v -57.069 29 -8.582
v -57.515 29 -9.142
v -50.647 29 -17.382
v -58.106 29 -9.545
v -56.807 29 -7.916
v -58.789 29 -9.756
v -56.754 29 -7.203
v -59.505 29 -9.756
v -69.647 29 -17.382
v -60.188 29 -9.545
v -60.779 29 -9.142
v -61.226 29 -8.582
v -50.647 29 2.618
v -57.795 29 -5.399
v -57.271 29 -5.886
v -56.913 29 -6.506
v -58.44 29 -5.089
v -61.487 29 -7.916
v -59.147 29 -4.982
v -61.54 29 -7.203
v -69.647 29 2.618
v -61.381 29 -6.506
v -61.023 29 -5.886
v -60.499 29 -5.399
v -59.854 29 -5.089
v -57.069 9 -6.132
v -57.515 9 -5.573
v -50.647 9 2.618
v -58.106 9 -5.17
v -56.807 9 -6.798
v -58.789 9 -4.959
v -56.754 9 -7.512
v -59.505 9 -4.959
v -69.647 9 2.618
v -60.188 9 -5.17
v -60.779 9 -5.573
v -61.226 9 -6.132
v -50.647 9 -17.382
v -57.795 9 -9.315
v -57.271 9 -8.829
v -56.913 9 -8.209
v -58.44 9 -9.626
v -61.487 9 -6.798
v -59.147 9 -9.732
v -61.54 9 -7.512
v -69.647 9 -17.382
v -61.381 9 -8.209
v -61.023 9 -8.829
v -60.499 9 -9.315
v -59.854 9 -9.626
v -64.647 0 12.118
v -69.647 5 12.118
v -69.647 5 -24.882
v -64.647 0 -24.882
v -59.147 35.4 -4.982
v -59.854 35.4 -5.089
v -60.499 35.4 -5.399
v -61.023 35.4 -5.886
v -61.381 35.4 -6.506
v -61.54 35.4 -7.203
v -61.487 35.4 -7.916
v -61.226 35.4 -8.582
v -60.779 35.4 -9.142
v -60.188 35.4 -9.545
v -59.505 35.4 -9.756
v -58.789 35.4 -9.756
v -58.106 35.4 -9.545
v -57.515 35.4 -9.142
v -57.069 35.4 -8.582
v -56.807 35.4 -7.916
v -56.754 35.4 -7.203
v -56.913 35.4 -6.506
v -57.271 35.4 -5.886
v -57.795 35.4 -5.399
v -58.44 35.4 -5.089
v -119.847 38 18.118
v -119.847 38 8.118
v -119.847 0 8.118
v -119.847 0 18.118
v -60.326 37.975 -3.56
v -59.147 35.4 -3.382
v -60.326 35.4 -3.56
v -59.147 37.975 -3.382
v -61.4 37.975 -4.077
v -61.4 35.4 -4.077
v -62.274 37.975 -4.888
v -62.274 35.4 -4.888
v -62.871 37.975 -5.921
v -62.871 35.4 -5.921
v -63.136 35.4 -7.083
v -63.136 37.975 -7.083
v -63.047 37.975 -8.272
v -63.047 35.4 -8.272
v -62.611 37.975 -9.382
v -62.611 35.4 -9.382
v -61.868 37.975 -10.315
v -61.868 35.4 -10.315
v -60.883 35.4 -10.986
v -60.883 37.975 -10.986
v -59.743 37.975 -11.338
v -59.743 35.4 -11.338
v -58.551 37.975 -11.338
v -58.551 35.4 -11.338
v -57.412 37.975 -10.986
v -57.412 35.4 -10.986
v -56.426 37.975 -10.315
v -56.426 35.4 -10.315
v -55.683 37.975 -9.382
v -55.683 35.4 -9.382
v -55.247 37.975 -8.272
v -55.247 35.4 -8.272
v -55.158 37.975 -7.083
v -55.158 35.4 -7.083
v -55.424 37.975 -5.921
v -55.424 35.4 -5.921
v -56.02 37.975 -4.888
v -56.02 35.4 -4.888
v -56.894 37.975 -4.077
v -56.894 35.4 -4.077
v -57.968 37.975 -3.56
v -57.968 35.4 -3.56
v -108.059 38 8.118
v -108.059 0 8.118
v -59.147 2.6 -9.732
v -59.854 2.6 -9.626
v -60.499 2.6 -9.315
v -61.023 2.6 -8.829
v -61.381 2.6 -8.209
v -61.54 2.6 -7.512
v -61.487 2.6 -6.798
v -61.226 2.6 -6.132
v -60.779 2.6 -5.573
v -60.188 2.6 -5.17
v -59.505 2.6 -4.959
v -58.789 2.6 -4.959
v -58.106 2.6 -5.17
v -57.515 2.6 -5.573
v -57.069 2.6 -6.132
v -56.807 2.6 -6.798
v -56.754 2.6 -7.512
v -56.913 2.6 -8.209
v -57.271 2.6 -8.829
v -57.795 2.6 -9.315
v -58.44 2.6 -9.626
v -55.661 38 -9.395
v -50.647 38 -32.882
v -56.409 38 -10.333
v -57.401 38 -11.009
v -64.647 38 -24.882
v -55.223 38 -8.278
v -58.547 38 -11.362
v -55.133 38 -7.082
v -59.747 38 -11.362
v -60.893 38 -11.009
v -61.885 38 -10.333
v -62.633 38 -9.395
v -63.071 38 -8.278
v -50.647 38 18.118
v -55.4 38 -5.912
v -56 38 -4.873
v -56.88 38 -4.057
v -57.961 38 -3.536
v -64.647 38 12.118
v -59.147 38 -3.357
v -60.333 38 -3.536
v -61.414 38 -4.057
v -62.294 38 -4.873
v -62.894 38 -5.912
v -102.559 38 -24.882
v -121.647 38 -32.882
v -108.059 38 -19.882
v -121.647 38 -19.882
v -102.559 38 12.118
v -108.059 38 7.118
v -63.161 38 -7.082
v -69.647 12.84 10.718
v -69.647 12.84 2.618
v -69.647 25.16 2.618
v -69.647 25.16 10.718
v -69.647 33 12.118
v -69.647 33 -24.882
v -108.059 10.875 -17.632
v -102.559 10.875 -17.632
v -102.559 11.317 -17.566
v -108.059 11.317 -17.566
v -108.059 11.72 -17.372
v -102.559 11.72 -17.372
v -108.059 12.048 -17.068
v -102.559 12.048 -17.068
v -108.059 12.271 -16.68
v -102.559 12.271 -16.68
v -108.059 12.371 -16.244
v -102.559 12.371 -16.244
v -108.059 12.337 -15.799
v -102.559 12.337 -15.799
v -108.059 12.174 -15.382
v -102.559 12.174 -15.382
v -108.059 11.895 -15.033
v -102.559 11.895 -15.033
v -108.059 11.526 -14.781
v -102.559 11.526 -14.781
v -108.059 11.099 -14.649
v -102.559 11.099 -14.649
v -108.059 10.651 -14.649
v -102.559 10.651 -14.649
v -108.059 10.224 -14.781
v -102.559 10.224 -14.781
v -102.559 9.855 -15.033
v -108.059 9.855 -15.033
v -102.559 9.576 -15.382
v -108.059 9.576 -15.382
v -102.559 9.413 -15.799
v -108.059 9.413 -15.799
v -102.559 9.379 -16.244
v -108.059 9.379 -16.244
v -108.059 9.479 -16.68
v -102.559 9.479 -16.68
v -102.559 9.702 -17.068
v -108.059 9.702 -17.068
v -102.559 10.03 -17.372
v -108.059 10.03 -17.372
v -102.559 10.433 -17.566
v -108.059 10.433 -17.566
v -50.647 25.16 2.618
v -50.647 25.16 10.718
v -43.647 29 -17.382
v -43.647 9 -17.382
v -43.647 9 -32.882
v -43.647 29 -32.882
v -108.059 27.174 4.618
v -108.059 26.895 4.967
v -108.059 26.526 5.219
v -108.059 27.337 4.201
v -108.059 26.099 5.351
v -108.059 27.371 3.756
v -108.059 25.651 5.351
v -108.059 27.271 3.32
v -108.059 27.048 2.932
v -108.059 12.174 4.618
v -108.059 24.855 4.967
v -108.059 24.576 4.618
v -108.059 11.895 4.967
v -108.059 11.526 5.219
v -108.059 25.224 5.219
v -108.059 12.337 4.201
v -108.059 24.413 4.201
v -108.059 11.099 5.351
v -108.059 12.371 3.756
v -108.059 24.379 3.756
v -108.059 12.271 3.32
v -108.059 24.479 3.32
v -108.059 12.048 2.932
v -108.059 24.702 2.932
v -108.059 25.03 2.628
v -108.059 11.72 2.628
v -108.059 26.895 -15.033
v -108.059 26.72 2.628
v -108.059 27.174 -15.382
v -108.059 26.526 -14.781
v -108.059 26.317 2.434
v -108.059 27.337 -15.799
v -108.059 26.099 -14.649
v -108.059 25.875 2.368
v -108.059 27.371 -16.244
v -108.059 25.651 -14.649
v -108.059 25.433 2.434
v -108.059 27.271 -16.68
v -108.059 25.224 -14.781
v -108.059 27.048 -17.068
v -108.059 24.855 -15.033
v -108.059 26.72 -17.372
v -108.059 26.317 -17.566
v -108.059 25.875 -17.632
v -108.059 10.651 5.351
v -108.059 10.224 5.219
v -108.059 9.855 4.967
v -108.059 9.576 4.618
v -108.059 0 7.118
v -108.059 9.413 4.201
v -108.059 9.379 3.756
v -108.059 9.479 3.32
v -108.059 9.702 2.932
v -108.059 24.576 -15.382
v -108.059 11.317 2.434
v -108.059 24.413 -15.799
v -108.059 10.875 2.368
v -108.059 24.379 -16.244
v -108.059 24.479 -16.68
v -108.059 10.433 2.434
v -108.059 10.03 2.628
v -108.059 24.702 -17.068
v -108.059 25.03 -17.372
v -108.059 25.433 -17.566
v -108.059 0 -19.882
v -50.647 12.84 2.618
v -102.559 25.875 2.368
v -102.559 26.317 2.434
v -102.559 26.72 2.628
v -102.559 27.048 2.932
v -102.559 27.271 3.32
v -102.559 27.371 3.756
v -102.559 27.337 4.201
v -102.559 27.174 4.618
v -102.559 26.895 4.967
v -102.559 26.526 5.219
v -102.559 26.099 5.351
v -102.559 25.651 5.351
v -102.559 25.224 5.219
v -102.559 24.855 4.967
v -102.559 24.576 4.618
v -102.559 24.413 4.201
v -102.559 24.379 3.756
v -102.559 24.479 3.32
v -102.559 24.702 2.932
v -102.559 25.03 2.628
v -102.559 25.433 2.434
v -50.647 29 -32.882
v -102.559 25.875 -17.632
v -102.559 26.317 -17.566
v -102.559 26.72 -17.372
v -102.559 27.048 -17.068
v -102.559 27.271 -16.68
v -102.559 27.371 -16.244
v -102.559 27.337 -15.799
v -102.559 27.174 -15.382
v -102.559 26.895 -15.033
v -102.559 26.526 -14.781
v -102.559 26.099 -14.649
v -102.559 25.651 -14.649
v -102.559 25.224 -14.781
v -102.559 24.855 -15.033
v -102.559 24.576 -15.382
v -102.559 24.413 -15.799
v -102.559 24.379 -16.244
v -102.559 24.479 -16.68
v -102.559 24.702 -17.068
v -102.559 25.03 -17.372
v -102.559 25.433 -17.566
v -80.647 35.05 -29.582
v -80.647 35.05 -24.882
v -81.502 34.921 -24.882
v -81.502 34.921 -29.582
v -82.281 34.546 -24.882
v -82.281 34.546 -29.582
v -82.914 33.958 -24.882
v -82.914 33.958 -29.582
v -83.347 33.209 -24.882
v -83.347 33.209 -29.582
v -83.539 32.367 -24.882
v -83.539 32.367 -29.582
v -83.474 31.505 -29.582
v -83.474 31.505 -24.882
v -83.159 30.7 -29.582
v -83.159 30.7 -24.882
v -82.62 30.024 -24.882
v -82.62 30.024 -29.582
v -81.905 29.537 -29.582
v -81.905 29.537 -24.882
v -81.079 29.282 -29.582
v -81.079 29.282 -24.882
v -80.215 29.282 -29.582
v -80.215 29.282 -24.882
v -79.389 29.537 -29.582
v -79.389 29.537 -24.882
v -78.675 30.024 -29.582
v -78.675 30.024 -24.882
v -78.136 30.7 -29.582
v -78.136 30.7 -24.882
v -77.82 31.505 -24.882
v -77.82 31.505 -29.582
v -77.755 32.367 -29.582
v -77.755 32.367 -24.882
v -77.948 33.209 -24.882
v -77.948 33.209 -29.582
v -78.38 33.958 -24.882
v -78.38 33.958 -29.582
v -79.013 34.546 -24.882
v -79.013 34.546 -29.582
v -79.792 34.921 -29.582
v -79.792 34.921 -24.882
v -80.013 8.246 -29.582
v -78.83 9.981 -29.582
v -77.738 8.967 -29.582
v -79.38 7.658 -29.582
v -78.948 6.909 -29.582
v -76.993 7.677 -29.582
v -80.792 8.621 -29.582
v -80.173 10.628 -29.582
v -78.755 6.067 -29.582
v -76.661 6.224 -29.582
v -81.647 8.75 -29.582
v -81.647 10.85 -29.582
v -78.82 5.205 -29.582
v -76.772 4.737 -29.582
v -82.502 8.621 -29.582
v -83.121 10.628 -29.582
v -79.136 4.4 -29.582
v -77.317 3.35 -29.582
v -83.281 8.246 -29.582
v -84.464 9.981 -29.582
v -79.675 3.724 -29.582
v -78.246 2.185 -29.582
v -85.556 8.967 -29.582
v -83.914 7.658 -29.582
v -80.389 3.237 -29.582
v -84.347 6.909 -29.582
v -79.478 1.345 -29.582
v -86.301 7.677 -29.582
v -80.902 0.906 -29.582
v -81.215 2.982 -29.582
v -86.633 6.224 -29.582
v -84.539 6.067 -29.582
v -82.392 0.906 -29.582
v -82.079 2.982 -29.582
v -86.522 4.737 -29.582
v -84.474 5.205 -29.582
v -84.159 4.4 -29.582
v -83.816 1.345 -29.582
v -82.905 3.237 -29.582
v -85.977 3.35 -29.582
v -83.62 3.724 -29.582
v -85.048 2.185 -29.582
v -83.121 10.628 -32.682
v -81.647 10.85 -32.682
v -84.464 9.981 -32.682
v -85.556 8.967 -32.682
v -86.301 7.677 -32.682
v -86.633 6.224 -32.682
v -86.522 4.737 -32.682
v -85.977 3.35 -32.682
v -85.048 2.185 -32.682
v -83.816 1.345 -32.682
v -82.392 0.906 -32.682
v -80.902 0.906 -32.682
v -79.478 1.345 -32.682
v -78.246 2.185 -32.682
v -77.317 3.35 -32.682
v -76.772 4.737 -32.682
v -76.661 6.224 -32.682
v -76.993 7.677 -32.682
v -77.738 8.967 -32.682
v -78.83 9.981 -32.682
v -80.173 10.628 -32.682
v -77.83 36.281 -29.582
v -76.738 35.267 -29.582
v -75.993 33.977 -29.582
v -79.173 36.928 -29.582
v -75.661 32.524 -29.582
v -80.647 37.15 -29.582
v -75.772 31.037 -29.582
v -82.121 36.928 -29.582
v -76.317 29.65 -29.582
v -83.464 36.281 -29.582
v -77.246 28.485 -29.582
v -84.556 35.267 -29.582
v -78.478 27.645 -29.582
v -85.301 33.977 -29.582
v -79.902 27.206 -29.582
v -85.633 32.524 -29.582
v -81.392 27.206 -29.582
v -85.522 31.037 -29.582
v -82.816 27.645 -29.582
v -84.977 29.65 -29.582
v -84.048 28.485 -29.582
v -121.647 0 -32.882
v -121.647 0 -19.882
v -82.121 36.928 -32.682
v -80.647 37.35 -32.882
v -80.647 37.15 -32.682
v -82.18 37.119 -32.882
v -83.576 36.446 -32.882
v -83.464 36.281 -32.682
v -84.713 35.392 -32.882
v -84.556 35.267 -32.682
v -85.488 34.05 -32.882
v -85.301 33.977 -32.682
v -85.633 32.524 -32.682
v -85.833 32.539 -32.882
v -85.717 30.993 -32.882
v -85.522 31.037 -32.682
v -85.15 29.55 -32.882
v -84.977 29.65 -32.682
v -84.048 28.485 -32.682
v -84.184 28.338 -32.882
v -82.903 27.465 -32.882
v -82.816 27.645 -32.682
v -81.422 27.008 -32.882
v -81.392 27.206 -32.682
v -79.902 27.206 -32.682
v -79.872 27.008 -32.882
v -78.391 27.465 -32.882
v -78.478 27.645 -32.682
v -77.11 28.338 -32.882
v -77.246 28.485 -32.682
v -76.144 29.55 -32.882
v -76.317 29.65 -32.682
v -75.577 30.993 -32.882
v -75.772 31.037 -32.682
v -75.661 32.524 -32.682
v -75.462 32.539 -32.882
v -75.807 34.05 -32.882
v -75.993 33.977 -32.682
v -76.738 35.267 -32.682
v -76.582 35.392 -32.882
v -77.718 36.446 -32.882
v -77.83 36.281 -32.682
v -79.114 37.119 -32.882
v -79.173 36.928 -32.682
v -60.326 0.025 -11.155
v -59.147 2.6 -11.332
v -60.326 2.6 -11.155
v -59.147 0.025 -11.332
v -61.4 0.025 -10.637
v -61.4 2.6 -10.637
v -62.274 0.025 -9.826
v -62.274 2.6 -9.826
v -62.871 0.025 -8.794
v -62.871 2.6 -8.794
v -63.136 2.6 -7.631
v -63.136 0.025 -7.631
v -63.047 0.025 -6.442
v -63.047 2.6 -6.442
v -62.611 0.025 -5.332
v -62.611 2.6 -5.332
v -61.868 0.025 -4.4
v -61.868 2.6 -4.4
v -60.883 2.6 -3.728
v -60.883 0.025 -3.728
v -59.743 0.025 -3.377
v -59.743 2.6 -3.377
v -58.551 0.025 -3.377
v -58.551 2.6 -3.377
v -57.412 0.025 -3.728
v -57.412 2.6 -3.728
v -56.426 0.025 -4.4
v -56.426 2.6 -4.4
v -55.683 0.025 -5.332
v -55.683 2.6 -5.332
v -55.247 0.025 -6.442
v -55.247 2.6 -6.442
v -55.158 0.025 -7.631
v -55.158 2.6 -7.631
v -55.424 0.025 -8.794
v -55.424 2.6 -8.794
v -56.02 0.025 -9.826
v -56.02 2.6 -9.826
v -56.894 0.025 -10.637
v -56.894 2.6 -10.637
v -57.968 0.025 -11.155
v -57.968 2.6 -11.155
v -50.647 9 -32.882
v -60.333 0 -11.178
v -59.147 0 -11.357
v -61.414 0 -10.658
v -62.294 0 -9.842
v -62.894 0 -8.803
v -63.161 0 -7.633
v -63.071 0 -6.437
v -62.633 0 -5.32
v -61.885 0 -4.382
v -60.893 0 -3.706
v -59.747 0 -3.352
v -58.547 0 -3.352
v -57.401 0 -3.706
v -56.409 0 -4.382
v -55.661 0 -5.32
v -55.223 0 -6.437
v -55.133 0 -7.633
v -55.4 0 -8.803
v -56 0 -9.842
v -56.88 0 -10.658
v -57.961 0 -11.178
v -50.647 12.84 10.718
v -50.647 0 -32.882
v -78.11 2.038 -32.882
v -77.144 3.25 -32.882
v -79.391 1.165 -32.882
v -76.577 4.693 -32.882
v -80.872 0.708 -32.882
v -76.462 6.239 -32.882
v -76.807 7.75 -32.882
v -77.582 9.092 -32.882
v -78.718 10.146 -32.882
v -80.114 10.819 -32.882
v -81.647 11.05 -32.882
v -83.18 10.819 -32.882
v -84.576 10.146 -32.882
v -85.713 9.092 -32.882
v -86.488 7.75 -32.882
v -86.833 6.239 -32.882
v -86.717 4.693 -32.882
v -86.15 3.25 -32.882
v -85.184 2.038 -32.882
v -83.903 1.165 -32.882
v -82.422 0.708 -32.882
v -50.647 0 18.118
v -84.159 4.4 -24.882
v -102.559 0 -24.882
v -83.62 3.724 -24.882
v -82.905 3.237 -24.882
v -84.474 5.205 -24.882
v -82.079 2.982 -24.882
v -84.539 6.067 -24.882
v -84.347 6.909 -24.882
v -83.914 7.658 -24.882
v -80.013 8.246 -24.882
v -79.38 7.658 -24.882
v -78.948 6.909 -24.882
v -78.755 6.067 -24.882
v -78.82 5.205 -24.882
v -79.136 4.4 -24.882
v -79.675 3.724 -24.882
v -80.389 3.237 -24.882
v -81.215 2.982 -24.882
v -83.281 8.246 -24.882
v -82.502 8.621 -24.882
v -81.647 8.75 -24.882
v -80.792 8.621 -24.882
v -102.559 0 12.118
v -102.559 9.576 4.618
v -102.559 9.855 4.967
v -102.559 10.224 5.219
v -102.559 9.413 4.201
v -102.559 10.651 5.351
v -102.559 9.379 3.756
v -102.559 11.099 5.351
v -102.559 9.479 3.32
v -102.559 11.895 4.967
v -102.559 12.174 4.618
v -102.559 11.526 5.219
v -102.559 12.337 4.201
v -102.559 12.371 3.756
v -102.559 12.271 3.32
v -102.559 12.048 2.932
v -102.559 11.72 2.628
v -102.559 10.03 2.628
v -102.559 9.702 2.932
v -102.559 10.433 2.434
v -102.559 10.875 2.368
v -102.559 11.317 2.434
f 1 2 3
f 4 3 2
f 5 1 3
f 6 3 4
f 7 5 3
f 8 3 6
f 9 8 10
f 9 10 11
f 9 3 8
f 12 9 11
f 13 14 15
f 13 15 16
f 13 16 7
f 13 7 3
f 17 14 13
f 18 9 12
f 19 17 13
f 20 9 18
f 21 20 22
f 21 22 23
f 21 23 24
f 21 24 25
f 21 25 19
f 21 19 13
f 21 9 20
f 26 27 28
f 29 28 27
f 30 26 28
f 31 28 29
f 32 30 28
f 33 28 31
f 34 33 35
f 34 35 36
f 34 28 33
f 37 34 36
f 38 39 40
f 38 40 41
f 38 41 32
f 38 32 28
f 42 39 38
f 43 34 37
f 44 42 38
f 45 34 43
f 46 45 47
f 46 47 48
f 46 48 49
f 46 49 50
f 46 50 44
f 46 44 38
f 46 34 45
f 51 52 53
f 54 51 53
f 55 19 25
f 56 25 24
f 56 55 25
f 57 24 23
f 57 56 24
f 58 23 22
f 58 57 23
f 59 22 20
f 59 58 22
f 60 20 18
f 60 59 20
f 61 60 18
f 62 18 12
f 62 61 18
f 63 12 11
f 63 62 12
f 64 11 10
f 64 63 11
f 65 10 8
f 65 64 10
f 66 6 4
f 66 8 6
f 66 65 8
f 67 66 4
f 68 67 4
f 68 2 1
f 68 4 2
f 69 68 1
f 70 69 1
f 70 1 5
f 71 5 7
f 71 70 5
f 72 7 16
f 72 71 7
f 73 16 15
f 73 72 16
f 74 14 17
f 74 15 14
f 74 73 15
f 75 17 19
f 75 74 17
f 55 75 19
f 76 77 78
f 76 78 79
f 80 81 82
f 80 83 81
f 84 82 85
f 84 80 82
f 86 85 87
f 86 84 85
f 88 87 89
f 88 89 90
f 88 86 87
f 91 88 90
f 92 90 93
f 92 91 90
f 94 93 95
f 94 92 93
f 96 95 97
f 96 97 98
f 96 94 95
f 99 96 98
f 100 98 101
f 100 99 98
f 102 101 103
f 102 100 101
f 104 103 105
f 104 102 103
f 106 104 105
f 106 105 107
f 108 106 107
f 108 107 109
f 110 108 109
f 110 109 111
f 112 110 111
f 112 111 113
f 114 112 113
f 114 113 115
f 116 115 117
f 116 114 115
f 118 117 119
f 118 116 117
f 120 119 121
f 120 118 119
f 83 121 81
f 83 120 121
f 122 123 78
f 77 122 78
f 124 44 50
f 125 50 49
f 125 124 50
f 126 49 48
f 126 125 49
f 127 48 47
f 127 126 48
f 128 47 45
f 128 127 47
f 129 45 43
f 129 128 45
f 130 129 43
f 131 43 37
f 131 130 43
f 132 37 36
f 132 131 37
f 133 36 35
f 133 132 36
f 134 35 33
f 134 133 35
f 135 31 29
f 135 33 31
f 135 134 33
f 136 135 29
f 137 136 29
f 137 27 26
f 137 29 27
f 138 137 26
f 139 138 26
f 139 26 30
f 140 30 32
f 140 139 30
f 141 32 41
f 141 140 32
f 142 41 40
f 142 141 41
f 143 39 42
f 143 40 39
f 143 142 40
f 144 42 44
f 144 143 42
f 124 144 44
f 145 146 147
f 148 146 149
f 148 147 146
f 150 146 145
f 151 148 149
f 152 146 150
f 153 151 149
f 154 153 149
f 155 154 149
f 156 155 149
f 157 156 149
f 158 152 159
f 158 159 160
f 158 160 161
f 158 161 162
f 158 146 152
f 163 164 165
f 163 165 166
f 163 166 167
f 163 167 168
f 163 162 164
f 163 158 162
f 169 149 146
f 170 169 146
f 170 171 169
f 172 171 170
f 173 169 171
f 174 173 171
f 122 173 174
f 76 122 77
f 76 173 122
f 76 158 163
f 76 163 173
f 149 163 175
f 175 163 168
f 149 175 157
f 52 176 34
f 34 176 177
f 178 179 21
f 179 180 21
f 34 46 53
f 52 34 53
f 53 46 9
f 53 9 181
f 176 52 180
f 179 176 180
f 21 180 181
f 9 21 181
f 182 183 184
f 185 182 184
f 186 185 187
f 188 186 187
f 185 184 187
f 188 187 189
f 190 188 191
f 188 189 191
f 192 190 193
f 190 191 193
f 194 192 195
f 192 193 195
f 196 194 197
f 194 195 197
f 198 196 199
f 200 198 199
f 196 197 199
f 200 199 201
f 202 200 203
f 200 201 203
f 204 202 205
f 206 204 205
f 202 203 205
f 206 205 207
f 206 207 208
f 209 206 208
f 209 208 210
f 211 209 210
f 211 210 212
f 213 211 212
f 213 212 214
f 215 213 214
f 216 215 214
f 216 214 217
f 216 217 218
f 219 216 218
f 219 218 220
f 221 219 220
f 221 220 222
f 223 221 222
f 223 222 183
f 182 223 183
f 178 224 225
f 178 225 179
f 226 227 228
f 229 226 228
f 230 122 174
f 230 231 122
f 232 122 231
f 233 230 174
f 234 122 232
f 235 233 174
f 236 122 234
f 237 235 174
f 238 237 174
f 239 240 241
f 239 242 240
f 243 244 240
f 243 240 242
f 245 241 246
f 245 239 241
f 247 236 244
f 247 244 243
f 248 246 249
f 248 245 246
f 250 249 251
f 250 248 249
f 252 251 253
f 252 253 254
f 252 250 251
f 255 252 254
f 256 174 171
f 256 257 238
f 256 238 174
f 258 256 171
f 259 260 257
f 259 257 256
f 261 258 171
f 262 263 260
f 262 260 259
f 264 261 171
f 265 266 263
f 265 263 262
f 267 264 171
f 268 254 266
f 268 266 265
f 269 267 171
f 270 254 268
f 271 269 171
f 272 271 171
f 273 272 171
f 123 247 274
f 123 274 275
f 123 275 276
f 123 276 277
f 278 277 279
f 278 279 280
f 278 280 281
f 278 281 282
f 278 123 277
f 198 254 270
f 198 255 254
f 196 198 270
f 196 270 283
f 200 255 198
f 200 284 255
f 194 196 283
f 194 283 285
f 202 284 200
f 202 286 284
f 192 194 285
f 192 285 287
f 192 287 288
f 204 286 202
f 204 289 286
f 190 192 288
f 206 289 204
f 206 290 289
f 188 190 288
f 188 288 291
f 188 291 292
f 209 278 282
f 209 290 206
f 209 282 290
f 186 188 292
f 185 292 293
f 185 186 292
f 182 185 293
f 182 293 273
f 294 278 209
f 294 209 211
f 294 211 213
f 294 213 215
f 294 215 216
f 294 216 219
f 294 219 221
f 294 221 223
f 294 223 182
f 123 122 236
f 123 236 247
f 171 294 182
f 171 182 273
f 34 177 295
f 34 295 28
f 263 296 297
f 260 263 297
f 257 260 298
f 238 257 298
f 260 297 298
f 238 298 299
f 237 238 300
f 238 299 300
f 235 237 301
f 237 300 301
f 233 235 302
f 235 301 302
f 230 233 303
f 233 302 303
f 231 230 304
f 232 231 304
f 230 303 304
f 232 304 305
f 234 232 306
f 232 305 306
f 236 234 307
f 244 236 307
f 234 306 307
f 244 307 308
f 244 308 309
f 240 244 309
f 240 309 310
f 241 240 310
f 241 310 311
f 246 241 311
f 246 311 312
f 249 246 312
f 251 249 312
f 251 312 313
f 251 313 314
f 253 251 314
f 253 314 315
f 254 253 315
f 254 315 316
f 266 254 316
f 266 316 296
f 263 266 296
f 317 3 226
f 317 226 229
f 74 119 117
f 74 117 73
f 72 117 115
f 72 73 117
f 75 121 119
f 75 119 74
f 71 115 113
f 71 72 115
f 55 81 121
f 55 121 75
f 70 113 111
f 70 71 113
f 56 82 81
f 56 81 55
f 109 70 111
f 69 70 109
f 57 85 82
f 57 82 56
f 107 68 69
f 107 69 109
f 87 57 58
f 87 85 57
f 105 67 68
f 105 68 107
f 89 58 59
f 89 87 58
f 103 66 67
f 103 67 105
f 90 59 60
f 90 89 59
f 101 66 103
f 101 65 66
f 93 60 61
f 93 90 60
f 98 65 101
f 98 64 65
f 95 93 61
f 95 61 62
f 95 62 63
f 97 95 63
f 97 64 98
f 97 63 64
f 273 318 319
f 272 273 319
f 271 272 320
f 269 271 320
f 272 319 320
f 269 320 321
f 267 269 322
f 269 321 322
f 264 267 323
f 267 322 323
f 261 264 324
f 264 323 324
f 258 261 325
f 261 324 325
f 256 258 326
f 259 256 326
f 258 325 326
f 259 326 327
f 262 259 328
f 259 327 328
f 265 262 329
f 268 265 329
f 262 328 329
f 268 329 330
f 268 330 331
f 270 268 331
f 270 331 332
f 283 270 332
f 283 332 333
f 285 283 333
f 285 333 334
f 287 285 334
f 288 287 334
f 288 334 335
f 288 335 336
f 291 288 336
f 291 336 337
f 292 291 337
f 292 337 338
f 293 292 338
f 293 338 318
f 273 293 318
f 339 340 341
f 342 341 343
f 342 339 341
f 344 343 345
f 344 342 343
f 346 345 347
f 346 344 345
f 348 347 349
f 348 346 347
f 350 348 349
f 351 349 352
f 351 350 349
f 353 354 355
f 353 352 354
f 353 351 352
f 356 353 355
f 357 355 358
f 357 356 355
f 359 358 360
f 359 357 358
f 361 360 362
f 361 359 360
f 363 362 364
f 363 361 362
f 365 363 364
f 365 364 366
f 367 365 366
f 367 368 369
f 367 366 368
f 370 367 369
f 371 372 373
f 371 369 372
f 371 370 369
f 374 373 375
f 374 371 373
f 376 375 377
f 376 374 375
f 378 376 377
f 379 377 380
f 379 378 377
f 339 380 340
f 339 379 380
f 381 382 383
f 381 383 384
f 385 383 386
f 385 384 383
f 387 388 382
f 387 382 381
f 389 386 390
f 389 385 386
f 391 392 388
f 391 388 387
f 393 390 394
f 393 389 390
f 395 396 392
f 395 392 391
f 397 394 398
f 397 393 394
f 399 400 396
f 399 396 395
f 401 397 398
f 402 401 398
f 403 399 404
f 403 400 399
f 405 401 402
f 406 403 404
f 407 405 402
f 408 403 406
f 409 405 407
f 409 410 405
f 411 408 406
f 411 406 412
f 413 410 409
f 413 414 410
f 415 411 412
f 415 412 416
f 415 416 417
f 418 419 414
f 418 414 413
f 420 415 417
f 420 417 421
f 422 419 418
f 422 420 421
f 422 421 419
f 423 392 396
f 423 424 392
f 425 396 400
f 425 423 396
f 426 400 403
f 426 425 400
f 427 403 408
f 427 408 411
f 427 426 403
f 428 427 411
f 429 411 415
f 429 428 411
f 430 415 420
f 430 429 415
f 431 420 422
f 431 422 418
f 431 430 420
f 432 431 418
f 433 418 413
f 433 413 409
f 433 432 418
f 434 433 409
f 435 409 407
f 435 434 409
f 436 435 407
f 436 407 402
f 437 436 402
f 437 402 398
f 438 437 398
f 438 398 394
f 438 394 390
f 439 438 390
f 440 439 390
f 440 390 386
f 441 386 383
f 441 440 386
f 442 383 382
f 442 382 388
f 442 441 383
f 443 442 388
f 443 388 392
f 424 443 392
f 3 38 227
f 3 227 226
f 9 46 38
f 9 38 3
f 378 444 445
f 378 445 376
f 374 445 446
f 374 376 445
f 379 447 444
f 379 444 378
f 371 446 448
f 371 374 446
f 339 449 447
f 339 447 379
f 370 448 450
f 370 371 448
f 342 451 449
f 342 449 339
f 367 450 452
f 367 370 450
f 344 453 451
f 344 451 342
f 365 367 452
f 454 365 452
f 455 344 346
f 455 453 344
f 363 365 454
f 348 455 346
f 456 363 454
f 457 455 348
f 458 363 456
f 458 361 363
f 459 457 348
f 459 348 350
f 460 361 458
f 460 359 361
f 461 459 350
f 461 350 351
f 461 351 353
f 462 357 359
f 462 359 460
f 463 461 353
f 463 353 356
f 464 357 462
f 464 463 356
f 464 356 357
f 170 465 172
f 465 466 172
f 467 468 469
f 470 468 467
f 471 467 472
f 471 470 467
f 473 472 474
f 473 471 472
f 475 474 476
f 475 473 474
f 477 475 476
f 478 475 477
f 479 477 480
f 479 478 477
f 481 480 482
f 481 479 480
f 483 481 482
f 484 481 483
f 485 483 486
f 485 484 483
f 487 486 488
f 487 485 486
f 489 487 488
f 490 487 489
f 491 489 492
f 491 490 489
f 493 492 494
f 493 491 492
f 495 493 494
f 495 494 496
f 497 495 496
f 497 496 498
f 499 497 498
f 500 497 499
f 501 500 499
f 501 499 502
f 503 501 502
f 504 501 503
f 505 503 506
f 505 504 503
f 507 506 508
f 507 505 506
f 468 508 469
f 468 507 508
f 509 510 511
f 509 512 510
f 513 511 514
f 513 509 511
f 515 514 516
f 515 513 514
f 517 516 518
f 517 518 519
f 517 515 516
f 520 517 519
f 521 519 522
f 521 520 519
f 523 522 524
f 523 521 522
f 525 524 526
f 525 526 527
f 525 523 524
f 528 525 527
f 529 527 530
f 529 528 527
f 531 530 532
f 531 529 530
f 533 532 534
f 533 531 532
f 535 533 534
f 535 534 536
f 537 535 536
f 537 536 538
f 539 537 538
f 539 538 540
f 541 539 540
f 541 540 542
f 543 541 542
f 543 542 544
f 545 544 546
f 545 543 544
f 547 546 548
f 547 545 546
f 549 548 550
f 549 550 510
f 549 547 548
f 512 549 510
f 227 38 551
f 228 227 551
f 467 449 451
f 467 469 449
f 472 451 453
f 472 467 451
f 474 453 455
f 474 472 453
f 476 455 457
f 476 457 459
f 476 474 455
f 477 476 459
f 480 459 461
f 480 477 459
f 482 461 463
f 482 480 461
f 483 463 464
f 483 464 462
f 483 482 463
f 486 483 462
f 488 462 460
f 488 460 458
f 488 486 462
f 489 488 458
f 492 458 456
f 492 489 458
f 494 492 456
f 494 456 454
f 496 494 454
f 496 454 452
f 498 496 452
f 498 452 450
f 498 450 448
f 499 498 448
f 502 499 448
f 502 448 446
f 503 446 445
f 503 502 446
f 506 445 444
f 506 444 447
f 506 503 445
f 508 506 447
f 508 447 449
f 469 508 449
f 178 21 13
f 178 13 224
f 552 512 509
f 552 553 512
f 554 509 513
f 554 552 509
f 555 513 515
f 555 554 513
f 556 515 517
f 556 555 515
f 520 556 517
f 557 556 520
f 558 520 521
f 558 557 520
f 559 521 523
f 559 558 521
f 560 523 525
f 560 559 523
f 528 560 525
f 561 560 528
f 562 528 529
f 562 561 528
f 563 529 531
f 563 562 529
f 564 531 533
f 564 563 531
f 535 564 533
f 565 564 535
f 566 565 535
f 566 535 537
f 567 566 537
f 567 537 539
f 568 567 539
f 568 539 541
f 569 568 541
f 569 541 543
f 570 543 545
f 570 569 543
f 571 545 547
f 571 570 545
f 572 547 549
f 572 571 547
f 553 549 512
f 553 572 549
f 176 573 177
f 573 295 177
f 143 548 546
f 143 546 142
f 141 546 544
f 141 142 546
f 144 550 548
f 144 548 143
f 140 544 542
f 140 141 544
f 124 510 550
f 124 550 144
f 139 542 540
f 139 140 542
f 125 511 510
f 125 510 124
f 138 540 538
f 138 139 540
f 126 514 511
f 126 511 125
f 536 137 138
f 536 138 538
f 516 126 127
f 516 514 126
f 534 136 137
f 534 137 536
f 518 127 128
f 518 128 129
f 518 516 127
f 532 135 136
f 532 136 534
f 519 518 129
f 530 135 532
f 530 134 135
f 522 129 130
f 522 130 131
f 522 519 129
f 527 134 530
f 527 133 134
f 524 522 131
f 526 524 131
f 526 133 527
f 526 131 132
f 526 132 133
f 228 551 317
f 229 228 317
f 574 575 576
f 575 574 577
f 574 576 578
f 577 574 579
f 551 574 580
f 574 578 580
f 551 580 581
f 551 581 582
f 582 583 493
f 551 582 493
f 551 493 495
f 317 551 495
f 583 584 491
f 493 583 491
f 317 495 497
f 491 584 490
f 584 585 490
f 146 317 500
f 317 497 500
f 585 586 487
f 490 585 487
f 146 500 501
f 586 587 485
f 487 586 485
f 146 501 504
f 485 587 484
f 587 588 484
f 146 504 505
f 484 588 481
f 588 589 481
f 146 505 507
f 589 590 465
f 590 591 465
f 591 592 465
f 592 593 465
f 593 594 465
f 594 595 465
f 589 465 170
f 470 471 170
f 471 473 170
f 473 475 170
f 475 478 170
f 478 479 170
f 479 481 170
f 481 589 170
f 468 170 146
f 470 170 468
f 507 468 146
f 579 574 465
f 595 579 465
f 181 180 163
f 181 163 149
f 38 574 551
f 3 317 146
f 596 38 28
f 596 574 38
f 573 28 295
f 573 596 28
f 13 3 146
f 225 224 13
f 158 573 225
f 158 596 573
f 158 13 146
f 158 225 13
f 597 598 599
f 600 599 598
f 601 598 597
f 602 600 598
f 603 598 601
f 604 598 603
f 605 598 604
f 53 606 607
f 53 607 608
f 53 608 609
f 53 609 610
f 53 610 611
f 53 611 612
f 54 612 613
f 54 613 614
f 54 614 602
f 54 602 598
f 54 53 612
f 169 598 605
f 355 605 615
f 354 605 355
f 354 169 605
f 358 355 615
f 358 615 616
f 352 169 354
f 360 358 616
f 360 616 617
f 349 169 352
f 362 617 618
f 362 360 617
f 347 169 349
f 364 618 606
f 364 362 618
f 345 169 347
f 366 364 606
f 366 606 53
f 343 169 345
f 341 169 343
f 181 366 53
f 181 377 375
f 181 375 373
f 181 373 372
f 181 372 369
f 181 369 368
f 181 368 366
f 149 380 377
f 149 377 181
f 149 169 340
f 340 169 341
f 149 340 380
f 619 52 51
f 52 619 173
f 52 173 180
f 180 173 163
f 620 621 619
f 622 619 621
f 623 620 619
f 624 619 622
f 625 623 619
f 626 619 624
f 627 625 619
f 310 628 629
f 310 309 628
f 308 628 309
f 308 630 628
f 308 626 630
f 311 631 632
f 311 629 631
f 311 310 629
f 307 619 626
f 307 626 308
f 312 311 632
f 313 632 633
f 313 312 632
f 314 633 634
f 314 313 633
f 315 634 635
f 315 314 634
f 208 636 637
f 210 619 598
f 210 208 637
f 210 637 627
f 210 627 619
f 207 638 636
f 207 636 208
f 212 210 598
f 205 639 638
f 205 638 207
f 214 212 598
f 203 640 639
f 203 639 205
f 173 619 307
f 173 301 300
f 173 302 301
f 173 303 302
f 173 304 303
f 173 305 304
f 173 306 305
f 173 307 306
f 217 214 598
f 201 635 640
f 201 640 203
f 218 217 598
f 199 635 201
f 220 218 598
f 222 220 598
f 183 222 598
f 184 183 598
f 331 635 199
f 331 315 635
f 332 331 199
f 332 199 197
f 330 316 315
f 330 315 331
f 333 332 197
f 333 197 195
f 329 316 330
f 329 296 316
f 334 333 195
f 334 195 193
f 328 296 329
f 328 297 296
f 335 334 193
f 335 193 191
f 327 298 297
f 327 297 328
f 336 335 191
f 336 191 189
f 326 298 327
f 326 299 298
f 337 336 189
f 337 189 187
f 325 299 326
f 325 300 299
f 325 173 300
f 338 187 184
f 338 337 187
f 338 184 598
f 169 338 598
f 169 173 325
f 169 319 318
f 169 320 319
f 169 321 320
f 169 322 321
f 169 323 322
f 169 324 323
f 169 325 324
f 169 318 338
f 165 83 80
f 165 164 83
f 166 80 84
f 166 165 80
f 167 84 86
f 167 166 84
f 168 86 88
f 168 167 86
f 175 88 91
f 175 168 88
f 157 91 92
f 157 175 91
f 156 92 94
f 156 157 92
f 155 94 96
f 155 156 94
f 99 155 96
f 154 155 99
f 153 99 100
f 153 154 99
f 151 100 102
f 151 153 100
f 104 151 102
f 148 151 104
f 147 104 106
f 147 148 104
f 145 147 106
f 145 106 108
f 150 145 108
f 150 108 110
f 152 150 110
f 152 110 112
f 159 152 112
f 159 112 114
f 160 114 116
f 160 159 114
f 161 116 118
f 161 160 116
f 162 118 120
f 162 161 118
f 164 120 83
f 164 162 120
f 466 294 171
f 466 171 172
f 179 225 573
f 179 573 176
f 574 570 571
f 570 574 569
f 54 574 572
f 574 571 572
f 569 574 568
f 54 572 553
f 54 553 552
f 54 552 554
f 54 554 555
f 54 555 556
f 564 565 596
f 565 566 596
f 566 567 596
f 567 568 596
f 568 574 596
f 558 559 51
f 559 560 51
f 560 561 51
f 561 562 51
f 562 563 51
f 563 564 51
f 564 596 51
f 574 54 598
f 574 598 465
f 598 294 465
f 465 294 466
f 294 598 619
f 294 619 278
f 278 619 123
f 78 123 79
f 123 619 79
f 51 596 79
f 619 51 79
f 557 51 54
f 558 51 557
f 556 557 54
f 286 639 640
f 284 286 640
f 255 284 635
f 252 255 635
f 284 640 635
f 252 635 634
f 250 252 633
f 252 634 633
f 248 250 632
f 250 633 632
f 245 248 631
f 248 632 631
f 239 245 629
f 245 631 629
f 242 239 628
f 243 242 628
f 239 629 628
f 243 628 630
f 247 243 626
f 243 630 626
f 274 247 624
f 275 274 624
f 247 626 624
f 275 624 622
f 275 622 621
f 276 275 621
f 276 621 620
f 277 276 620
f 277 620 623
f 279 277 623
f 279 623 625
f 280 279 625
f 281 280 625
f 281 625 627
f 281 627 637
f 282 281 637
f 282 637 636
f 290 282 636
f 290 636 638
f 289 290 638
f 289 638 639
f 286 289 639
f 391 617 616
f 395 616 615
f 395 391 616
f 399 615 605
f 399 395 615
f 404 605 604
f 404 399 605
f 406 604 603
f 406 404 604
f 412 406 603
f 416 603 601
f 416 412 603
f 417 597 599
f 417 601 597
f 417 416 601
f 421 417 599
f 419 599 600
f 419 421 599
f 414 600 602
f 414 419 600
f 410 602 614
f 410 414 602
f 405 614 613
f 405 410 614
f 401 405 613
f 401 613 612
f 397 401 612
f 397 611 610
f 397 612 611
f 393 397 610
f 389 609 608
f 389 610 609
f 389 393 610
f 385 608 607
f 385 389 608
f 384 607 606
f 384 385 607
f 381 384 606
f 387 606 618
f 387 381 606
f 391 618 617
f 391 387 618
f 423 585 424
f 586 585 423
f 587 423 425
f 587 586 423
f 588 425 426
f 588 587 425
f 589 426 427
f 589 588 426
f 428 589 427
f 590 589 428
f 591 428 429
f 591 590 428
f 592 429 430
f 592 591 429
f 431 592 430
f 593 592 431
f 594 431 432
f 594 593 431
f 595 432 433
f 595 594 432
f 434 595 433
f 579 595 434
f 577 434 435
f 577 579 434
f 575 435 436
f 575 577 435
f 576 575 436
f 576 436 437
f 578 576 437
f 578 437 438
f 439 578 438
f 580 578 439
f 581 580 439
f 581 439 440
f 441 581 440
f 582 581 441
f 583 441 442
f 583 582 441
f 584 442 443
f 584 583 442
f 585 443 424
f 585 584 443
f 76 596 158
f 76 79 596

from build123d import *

# Parameters (mm, degrees)
SALIENTE_EXTRUIR1_DEPTH                     = 38
CROQUIS2_W                                  = 32.911764705
CROQUIS2_H                                  = 37
CORTAR_EXTRUIR1_DEPTH                       = 38
CROQUIS3_R                                  = 1.5
CORTAR_EXTRUIR3_DEPTH                       = 10
CROQUIS5_W                                  = 13.588235295
CROQUIS5_H                                  = 38
CORTAR_EXTRUIR4_DEPTH                       = 1
CROQUIS8_W                                  = 20
CROQUIS8_H                                  = 20
CORTAR_EXTRUIR5_DEPTH                       = 8
CROQUIS10_W                                 = 8
CROQUIS10_H                                 = 12
CORTAR_EXTRUIR7_DEPTH                       = 10
CROQUIS11_W                                 = 10
CROQUIS11_H                                 = 38
CORTAR_EXTRUIR8_DEPTH                       = 1.8
CROQUIS13_W                                 = 49
CROQUIS13_H                                 = 38
SALIENTE_EXTRUIR2_DEPTH                     = 12
CROQUIS15_W                                 = 71
CROQUIS15_H                                 = 38
SALIENTE_EXTRUIR3_DEPTH                     = 2
REFRENTADO_PARA_TORNILLO_CON_CABEZA_2_COUNT = 2
REFRENTADO_PARA_TORNILLO_CON_CABEZA_2_PITCH = 26.31900454
CROQUIS18_W                                 = 19
CROQUIS18_H                                 = 8
CORTAR_EXTRUIR9_DEPTH                       = 0.16
CROQUIS19_W                                 = 19
CROQUIS19_H                                 = 8
CORTAR_EXTRUIR10_DEPTH                      = 0.16
CROQUIS20_W                                 = 19
CROQUIS20_H                                 = 12.32
CORTAR_EXTRUIR11_DEPTH                      = 0.1
CHAFL_N3_SIZE                               = 5
CROQUIS26_W                                 = 15.5
CROQUIS26_H                                 = 20
SALIENTE_EXTRUIR4_DEPTH                     = 7


with BuildPart() as part:
    # Croquis1 → Saliente-Extruir1 (new body)
    with BuildSketch(Plane(origin=(0, 0, 0), x_dir=(1, 0, 0), z_dir=(0, 1, 0))):
        Polygon((-121.647058824, 30.882352941), (-62.647058824, 30.882352941), (-62.647058824, -18.117647059), (-121.647058824, -18.117647059), (-121.647058824, -7.117647059), (-108.058823529, -7.117647059), (-108.058823529, 19.882352941), (-121.647058824, 19.882352941), align=None)
    extrude(amount=SALIENTE_EXTRUIR1_DEPTH)

    # Croquis2 → Cortar-Extruir1 (cut)
    with BuildSketch(Plane(origin=(0, 38, 0), x_dir=(1, 0, 0), z_dir=(0, 1, 0))):
        with Locations((-86.102941176, 6.382352941)):
            Rectangle(CROQUIS2_W, CROQUIS2_H)
    extrude(amount=-CORTAR_EXTRUIR1_DEPTH, mode=Mode.SUBTRACT)

    # Croquis3 → Cortar-Extruir3 (cut)
    with BuildSketch(Plane(origin=(-102.558823529, 0, 0), x_dir=(0, 0, -1), z_dir=(1, 0, 0))):
        with Locations((16.132352941, 10.875)):
            Circle(CROQUIS3_R)
        with Locations((16.132352941, 25.875)):
            Circle(CROQUIS3_R)
        with Locations((-3.867647059, 10.875)):
            Circle(CROQUIS3_R)
        with Locations((-3.867647059, 25.875)):
            Circle(CROQUIS3_R)
    extrude(amount=-CORTAR_EXTRUIR3_DEPTH, mode=Mode.SUBTRACT)

    # Croquis5 → Cortar-Extruir4 (cut)
    with BuildSketch(Plane(origin=(0, 0, 7.117647059), x_dir=(-1, 0, 0), z_dir=(0, 0, -1))):
        with Locations((114.852941177, 19)):
            Rectangle(CROQUIS5_W, CROQUIS5_H)
    extrude(amount=-CORTAR_EXTRUIR4_DEPTH, mode=Mode.SUBTRACT)

    # Croquis8 → Cortar-Extruir5 (cut)
    with BuildSketch(Plane(origin=(-62.647058824, 0, 0), x_dir=(0, 0, -1), z_dir=(1, 0, 0))):
        with Locations((7.382352941, 19)):
            Rectangle(CROQUIS8_W, CROQUIS8_H)
    extrude(amount=-CORTAR_EXTRUIR5_DEPTH, mode=Mode.SUBTRACT)

    # Croquis10 → Cortar-Extruir7 (cut)
    with BuildSketch(Plane(origin=(-62.647058824, 0, 0), x_dir=(0, 0, -1), z_dir=(1, 0, 0))):
        with Locations((-6.617647059, 19)):
            Rectangle(CROQUIS10_W, CROQUIS10_H)
    extrude(amount=-CORTAR_EXTRUIR7_DEPTH, mode=Mode.SUBTRACT)

    # Croquis11 → Cortar-Extruir8 (cut)
    with BuildSketch(Plane.ZY.offset(121.647058824)):
        with Locations((13.117647059, 19)):
            Rectangle(CROQUIS11_W, CROQUIS11_H)
    extrude(amount=-CORTAR_EXTRUIR8_DEPTH, mode=Mode.SUBTRACT)

    # Croquis13 → Saliente-Extruir2 (add)
    with BuildSketch(Plane(origin=(-62.647058824, 0, 0), x_dir=(0, 0, -1), z_dir=(1, 0, 0))):
        with Locations((6.382352941, 19)):
            Rectangle(CROQUIS13_W, CROQUIS13_H)
        Polygon((17.382352941, 9), (17.382352941, 29), (-2.617647059, 29), (-2.617647059, 25), (-10.617647059, 25), (-10.617647059, 13), (-2.617647059, 13), (-2.617647059, 9), align=None, mode=Mode.SUBTRACT)
    extrude(amount=SALIENTE_EXTRUIR2_DEPTH)

    # Croquis15 → Saliente-Extruir3 (add)
    with BuildSketch(Plane(origin=(0, 0, -30.882352941), x_dir=(-1, 0, 0), z_dir=(0, 0, -1))):
        with Locations((86.147058824, 19)):
            Rectangle(CROQUIS15_W, CROQUIS15_H)
    extrude(amount=SALIENTE_EXTRUIR3_DEPTH)

    # Croquis17 → Refrentado para tornillo con cabeza plan (revolve, cut)
    with BuildSketch(Plane(origin=(-81.647058824, 5.85, -32.882352941), x_dir=(0, 1, 0), z_dir=(1, 0, 0))):
        Polygon((0, 0), (0, 21.742495795), (2.9, 20), (2.9, 3.3), (5, 3.3), (5, 0.2), (5.2, 0), align=None)
    refrentado_para_tornillo_con_cabeza_plan = revolve(axis=Axis((-81.647058824, 5.85, -39.232352941), (0, 0, 1)), mode=Mode.SUBTRACT)

    # Refrentado para tornillo con cabeza  2: Refrentado para tornillo con cabeza plan ×2
    with Locations(*[Vector(0.037995358, 0.999277916, 0) * (i * REFRENTADO_PARA_TORNILLO_CON_CABEZA_2_PITCH) for i in range(1, REFRENTADO_PARA_TORNILLO_CON_CABEZA_2_COUNT)]):
        add(refrentado_para_tornillo_con_cabeza_plan, mode=Mode.SUBTRACT)

    # Croquis18 → Cortar-Extruir9 (cut)
    with BuildSketch(Plane(origin=(0, 13, 0), x_dir=(1, 0, 0), z_dir=(0, 1, 0))):
        with Locations((-60.147058824, -6.617647059)):
            Rectangle(CROQUIS18_W, CROQUIS18_H)
    extrude(amount=-CORTAR_EXTRUIR9_DEPTH, mode=Mode.SUBTRACT)

    # Croquis19 → Cortar-Extruir10 (cut)
    with BuildSketch(Plane(origin=(0, 25, 0), x_dir=(-1, 0, 0), z_dir=(0, -1, 0))):
        with Locations((60.147058824, -6.617647059)):
            Rectangle(CROQUIS19_W, CROQUIS19_H)
    extrude(amount=-CORTAR_EXTRUIR10_DEPTH, mode=Mode.SUBTRACT)

    # Croquis20 → Cortar-Extruir11 (cut)
    with BuildSketch(Plane(origin=(0, 0, 10.617647059), x_dir=(-1, 0, 0), z_dir=(0, 0, -1))):
        with Locations((60.147058824, 19)):
            Rectangle(CROQUIS20_W, CROQUIS20_H)
    extrude(amount=-CORTAR_EXTRUIR11_DEPTH, mode=Mode.SUBTRACT)

    # Croquis23 → Refrentado para tornillo con cabeza  3 (revolve, cut)
    with BuildSketch(Plane(origin=(-59.147058824, 0, -7.332227312), x_dir=(0, 0, -1), z_dir=(1, 0, 0))):
        Polygon((0, 0), (0, 21.442065486), (2.4, 20), (2.4, 2.6), (4, 2.6), (4, 0.025), (4.025, 0), align=None)
    revolve(axis=Axis((-59.147058824, -6.35, -7.332227312), (0, 1, 0)), mode=Mode.SUBTRACT)

    # Croquis25 → Refrentado para tornillo con cabeza  4 (revolve, cut)
    with BuildSketch(Plane(origin=(-59.147058824, 38, -7.382352941), x_dir=(0, 0, 1), z_dir=(1, 0, 0))):
        Polygon((0, 0), (0, 21.442065486), (2.4, 20), (2.4, 2.6), (4, 2.6), (4, 0.025), (4.025, 0), align=None)
    revolve(axis=Axis((-59.147058824, 44.35, -7.382352941), (0, -1, 0)), mode=Mode.SUBTRACT)

    # Chaflán3
    chafl_n3_edges = [part.edges().sort_by_distance(p)[0] for p in [
        (-69.647058824, 0, -6.382352941),
        (-69.647058824, 38, -6.382352941),
    ]]
    chamfer(chafl_n3_edges, length=CHAFL_N3_SIZE)

    # Croquis26 → Saliente-Extruir4 (add)
    with BuildSketch(Plane(origin=(-50.647058824, 0, 0), x_dir=(0, 0, -1), z_dir=(1, 0, 0))):
        with Locations((25.132352941, 19)):
            Rectangle(CROQUIS26_W, CROQUIS26_H)
    extrude(amount=SALIENTE_EXTRUIR4_DEPTH)


solid = part.part
